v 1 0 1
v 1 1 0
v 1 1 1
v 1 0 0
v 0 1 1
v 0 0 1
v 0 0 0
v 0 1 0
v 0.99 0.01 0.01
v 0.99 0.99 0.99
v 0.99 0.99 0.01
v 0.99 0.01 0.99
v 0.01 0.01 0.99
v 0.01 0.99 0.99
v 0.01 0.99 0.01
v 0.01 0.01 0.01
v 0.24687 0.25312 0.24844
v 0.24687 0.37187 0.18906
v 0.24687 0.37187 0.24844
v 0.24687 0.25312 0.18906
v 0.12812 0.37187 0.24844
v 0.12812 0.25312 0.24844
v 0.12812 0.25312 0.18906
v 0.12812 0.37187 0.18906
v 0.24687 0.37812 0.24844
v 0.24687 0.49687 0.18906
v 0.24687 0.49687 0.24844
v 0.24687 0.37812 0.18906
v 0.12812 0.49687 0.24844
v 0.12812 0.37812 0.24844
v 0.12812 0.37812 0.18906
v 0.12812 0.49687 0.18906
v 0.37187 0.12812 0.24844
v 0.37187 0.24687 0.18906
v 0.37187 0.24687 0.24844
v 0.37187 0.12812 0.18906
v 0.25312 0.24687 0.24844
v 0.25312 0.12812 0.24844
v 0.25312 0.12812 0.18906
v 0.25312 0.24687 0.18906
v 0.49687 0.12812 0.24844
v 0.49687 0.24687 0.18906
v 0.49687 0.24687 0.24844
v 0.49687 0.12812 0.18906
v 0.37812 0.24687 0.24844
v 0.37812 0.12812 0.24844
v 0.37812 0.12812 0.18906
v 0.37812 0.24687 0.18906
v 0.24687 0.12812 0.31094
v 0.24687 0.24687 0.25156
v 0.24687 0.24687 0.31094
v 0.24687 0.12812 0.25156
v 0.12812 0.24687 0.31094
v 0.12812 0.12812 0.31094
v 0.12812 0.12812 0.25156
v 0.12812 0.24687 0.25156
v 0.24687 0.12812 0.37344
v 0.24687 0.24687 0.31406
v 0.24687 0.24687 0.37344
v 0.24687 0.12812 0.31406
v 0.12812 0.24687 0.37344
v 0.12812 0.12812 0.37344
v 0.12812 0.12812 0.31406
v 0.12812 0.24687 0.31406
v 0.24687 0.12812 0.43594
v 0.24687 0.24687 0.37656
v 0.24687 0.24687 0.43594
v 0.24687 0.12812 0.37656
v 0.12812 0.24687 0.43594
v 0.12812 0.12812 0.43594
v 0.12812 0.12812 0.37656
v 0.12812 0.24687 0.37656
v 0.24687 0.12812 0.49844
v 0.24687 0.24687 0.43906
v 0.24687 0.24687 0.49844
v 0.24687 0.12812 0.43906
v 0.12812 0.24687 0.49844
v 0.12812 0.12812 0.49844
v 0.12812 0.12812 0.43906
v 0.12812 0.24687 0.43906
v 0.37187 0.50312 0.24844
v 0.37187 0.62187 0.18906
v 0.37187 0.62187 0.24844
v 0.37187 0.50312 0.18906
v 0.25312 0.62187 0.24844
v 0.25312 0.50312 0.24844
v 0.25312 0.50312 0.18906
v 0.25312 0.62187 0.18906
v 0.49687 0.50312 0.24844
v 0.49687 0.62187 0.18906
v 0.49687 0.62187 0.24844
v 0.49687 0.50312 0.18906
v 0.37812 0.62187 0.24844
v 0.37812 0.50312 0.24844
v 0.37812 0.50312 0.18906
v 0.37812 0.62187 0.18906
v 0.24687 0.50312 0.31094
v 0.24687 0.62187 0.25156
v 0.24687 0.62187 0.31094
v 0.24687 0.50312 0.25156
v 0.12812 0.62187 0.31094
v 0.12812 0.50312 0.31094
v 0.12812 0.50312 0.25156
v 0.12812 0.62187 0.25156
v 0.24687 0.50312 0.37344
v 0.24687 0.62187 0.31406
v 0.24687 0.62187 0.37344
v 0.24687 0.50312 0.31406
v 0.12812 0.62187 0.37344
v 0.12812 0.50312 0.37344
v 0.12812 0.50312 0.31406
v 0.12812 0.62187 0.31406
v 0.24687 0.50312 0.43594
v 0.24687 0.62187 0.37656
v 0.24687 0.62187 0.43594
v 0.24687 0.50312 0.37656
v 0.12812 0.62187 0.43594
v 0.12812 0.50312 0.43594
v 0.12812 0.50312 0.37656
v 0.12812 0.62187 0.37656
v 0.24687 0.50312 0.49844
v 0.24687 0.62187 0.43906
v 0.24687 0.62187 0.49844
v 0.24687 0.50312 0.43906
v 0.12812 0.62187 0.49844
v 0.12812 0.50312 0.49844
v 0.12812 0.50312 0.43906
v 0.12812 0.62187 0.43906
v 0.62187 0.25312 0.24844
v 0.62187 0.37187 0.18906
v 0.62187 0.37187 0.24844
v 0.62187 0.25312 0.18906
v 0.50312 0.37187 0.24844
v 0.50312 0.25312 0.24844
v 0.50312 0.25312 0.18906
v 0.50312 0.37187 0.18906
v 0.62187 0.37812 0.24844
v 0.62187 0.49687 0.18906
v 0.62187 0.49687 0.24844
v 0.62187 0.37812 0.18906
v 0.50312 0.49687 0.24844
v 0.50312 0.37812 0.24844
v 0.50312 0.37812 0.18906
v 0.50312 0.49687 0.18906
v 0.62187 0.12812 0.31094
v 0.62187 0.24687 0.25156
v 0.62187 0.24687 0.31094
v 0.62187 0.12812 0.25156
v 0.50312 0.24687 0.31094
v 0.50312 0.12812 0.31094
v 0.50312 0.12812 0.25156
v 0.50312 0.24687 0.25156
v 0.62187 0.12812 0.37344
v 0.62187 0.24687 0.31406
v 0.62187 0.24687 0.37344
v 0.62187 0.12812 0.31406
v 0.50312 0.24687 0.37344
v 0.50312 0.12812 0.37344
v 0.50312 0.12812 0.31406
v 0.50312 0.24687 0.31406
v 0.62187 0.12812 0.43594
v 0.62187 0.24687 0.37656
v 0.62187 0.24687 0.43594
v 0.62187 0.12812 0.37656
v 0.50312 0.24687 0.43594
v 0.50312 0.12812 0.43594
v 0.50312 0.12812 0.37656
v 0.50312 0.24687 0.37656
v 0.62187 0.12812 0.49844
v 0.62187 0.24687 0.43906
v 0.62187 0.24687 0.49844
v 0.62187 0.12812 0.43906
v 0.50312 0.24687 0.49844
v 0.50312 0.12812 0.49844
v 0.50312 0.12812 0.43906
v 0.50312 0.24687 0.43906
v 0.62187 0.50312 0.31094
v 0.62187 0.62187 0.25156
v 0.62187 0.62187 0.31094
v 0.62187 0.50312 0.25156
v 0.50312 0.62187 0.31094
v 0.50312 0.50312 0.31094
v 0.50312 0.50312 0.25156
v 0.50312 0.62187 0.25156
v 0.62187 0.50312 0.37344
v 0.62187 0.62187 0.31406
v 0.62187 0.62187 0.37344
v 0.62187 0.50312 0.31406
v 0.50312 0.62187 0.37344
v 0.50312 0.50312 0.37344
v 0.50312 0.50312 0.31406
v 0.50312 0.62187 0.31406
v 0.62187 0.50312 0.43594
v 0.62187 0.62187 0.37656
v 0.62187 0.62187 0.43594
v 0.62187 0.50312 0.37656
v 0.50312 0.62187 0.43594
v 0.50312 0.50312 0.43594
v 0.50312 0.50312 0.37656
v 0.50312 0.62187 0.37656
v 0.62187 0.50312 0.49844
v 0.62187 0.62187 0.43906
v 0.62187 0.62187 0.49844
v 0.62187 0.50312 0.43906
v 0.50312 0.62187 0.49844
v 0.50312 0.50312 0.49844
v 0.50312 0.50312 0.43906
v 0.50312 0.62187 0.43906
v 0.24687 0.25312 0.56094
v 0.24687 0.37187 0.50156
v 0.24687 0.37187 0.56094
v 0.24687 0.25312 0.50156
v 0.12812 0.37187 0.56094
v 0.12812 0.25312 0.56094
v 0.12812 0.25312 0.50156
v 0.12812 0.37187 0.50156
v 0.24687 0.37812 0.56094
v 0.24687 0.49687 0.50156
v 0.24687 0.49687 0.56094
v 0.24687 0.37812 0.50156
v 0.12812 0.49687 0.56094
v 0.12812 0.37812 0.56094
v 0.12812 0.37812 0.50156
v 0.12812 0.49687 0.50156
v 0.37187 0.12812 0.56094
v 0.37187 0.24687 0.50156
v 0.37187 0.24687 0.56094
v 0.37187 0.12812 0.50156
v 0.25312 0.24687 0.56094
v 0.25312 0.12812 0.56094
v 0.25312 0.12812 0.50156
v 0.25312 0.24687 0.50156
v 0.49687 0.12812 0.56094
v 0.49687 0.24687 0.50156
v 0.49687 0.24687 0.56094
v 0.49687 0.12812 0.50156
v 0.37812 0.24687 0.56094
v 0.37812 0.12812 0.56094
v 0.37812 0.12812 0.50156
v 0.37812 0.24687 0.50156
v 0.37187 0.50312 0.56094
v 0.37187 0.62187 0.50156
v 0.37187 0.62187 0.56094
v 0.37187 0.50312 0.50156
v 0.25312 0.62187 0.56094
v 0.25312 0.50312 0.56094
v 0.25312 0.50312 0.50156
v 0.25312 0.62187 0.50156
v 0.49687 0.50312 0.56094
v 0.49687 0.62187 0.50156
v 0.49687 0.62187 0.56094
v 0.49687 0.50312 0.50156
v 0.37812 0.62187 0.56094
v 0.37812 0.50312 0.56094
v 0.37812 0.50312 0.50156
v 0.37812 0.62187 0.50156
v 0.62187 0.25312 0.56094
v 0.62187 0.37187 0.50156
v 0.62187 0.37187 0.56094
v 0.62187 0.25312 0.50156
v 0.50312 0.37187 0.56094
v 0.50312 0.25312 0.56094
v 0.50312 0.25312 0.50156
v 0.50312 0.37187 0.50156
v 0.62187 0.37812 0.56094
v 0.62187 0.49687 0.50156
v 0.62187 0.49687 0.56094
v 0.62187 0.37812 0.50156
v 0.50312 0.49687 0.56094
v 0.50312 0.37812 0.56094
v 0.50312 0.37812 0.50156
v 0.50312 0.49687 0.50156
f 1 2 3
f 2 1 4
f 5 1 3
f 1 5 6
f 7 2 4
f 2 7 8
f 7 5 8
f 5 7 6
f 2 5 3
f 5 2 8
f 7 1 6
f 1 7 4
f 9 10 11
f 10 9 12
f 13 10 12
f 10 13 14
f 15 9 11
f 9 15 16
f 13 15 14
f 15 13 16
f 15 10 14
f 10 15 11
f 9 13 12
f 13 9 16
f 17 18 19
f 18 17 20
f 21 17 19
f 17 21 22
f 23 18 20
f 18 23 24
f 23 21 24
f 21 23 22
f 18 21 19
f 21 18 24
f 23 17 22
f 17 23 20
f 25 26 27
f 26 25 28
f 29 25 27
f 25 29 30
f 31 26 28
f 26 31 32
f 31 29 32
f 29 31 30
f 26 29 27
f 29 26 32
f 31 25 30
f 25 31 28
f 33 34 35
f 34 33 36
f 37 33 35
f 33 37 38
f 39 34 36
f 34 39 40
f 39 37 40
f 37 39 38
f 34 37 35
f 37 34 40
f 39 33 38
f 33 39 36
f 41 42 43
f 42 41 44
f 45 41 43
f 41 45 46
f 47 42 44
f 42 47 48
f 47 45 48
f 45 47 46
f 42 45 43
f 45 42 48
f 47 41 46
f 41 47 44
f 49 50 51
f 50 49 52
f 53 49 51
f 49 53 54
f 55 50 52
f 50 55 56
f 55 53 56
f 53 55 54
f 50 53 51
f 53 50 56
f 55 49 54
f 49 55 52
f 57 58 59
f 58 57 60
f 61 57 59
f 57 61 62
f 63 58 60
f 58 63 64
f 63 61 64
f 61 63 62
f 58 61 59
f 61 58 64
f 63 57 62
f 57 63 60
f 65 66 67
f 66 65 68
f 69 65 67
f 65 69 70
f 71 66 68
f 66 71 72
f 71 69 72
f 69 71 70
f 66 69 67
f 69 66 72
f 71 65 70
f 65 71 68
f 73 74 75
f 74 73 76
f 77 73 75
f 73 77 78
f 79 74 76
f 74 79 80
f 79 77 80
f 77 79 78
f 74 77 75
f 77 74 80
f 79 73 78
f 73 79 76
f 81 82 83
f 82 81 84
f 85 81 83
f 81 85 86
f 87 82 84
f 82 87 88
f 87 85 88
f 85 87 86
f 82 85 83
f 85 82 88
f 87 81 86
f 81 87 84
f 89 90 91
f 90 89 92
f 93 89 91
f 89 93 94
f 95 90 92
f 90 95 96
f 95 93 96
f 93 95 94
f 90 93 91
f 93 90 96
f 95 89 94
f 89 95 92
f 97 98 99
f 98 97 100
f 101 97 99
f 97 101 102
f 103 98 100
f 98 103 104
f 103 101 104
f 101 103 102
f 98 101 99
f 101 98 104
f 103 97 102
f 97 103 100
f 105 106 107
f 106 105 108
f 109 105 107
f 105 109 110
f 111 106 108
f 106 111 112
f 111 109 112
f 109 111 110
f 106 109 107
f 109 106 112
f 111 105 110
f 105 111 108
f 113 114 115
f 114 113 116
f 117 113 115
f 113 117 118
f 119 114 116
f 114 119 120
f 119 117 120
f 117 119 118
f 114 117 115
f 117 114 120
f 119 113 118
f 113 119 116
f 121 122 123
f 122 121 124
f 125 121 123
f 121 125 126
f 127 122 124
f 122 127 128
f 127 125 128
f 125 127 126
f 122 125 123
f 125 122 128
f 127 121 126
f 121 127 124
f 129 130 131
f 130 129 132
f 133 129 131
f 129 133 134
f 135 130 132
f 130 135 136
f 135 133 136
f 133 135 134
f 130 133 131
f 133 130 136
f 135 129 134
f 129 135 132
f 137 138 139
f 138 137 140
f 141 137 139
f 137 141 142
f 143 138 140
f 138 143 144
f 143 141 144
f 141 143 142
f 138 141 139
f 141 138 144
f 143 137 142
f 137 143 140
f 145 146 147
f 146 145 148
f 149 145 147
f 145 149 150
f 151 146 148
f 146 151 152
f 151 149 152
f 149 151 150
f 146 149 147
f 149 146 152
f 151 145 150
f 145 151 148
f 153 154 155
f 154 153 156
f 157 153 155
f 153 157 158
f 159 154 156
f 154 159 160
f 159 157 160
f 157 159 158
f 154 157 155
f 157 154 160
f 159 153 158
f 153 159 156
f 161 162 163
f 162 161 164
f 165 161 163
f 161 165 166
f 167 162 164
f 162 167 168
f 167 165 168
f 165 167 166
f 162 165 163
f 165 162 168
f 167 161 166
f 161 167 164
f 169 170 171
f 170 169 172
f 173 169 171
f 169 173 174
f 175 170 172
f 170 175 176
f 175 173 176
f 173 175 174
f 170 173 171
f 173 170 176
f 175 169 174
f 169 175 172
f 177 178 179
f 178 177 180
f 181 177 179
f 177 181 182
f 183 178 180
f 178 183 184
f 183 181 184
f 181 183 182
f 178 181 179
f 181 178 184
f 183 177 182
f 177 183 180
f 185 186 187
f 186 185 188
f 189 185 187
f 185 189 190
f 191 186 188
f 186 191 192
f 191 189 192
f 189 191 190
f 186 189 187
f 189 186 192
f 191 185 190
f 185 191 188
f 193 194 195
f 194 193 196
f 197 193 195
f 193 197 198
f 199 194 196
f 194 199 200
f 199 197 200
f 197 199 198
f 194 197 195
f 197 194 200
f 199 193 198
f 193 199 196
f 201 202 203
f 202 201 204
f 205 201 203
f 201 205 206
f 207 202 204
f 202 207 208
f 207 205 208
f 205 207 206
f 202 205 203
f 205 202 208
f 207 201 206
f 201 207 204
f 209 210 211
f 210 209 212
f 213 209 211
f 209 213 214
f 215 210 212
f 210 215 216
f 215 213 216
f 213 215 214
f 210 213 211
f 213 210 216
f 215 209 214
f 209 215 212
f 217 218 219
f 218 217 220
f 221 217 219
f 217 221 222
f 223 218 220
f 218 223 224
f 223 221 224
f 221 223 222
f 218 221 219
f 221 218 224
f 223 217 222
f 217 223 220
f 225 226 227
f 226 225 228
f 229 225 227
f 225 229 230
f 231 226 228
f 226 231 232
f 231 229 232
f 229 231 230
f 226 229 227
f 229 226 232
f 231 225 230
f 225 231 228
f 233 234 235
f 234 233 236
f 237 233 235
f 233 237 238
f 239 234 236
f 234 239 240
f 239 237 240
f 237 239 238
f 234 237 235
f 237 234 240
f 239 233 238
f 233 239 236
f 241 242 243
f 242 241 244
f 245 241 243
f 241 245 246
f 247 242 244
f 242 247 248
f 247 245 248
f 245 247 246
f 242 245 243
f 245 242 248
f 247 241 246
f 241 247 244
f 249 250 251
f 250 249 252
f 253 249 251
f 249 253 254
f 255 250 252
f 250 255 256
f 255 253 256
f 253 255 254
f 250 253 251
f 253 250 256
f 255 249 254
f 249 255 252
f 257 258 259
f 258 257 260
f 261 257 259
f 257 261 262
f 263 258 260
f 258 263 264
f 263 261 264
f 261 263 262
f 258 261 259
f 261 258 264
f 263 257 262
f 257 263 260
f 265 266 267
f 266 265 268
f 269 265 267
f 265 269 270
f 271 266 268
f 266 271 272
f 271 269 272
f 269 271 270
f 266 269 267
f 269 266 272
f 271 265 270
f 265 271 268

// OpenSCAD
translate([0.1875, 0.3125, 0.21875]) color([0.14067843926211876, 0.3233092624720053, 0.6766209265725885]) cube([0.11875, 0.11875, 0.059375], center=true);
translate([0.1875, 0.4375, 0.21875]) color([0.5598941248919586, 0.2674263193966361, 0.7715367321750608]) cube([0.11875, 0.11875, 0.059375], center=true);
translate([0.3125, 0.1875, 0.21875]) color([0.7775867750177572, 0.3358457771023752, 0.7984986383285079]) cube([0.11875, 0.11875, 0.059375], center=true);
translate([0.4375, 0.1875, 0.21875]) color([0.3608344962449672, 0.130636609727118, 0.1470050456404287]) cube([0.11875, 0.11875, 0.059375], center=true);
translate([0.1875, 0.1875, 0.28125]) color([0.5817121628313788, 0.46286602772829477, 0.8824527290015699]) cube([0.11875, 0.11875, 0.059375], center=true);
translate([0.1875, 0.1875, 0.34375]) color([0.1201105517589024, 0.1938197880719691, 0.4695931850983104]) cube([0.11875, 0.11875, 0.059375], center=true);
translate([0.1875, 0.1875, 0.40625]) color([0.14078313852784263, 0.6451769219884874, 0.9811903017448982]) cube([0.11875, 0.11875, 0.059375], center=true);
translate([0.1875, 0.1875, 0.46875]) color([0.8740229692652243, 0.6541461711493592, 0.21289315855754942]) cube([0.11875, 0.11875, 0.059375], center=true);
translate([0.3125, 0.5625, 0.21875]) color([0.9328418457966335, 0.42345059226773774, 0.5012376899041451]) cube([0.11875, 0.11875, 0.059375], center=true);
translate([0.4375, 0.5625, 0.21875]) color([0.5811541702347708, 0.2791891573101454, 0.2092311813057095]) cube([0.11875, 0.11875, 0.059375], center=true);
translate([0.1875, 0.5625, 0.28125]) color([0.9628933046967749, 0.6198760626942967, 0.5999578261672418]) cube([0.11875, 0.11875, 0.059375], center=true);
translate([0.1875, 0.5625, 0.34375]) color([0.23874719597172656, 0.5159213977515871, 0.8042715508319355]) cube([0.11875, 0.11875, 0.059375], center=true);
translate([0.1875, 0.5625, 0.40625]) color([0.6755197251802578, 0.41487488756696345, 0.5733633065217538]) cube([0.11875, 0.11875, 0.059375], center=true);
translate([0.1875, 0.5625, 0.46875]) color([0.8352652083788017, 0.4789645616530247, 0.8888242662849705]) cube([0.11875, 0.11875, 0.059375], center=true);
translate([0.5625, 0.3125, 0.21875]) color([0.7977003312522131, 0.4430245559395397, 0.5757872208285841]) cube([0.11875, 0.11875, 0.059375], center=true);
translate([0.5625, 0.4375, 0.21875]) color([0.18894415855786206, 0.8084526775944827, 0.5240727557148024]) cube([0.11875, 0.11875, 0.059375], center=true);
translate([0.5625, 0.1875, 0.28125]) color([0.33009817895383553, 0.6358447971330878, 0.274476683198677]) cube([0.11875, 0.11875, 0.059375], center=true);
translate([0.5625, 0.1875, 0.34375]) color([0.7036882936284021, 0.9548751840233447, 0.5755708060880032]) cube([0.11875, 0.11875, 0.059375], center=true);
translate([0.5625, 0.1875, 0.40625]) color([0.41204698353559877, 0.5796286851254486, 0.28286322414623355]) cube([0.11875, 0.11875, 0.059375], center=true);
translate([0.5625, 0.1875, 0.46875]) color([0.83488960487533, 0.7968053445508819, 0.9111606805714901]) cube([0.11875, 0.11875, 0.059375], center=true);
translate([0.5625, 0.5625, 0.28125]) color([0.24277728252059738, 0.2698201644401115, 0.25372921938475945]) cube([0.11875, 0.11875, 0.059375], center=true);
translate([0.5625, 0.5625, 0.34375]) color([0.3248429479181304, 0.33731838939050207, 0.46012102584031667]) cube([0.11875, 0.11875, 0.059375], center=true);
translate([0.5625, 0.5625, 0.40625]) color([0.4972140619467261, 0.4460540182101679, 0.582257111213957]) cube([0.11875, 0.11875, 0.059375], center=true);
translate([0.5625, 0.5625, 0.46875]) color([0.38189019333285656, 0.9329183366158048, 0.74346568951076]) cube([0.11875, 0.11875, 0.059375], center=true);
translate([0.1875, 0.3125, 0.53125]) color([0.10367473231816282, 0.6513301228797536, 0.21210212161149367]) cube([0.11875, 0.11875, 0.059375], center=true);
translate([0.1875, 0.4375, 0.53125]) color([0.4071949612628585, 0.6715659813617996, 0.17871221391606673]) cube([0.11875, 0.11875, 0.059375], center=true);
translate([0.3125, 0.1875, 0.53125]) color([0.17752412341011714, 0.6556599876579107, 0.7040052939421468]) cube([0.11875, 0.11875, 0.059375], center=true);
translate([0.4375, 0.1875, 0.53125]) color([0.9236087761692187, 0.21340315940002685, 0.5989435772305987]) cube([0.11875, 0.11875, 0.059375], center=true);
translate([0.3125, 0.5625, 0.53125]) color([0.8450733127471588, 0.6003349610680997, 0.5954496070156984]) cube([0.11875, 0.11875, 0.059375], center=true);
translate([0.4375, 0.5625, 0.53125]) color([0.920709623693076, 0.4233833186292486, 0.4754938941291812]) cube([0.11875, 0.11875, 0.059375], center=true);
translate([0.5625, 0.3125, 0.53125]) color([0.872421437716006, 0.9767589381362137, 0.9086126193256788]) cube([0.11875, 0.11875, 0.059375], center=true);
translate([0.5625, 0.4375, 0.53125]) color([0.7884233486788577, 0.8262914624918754, 0.6636415038118221]) cube([0.11875, 0.11875, 0.059375], center=true);
color([0.3,0.3,0.3,0.3]) difference() { cube([1,1,1]); translate([0.01,0.01,0.01]) cube([0.98,0.98,0.98]); }
